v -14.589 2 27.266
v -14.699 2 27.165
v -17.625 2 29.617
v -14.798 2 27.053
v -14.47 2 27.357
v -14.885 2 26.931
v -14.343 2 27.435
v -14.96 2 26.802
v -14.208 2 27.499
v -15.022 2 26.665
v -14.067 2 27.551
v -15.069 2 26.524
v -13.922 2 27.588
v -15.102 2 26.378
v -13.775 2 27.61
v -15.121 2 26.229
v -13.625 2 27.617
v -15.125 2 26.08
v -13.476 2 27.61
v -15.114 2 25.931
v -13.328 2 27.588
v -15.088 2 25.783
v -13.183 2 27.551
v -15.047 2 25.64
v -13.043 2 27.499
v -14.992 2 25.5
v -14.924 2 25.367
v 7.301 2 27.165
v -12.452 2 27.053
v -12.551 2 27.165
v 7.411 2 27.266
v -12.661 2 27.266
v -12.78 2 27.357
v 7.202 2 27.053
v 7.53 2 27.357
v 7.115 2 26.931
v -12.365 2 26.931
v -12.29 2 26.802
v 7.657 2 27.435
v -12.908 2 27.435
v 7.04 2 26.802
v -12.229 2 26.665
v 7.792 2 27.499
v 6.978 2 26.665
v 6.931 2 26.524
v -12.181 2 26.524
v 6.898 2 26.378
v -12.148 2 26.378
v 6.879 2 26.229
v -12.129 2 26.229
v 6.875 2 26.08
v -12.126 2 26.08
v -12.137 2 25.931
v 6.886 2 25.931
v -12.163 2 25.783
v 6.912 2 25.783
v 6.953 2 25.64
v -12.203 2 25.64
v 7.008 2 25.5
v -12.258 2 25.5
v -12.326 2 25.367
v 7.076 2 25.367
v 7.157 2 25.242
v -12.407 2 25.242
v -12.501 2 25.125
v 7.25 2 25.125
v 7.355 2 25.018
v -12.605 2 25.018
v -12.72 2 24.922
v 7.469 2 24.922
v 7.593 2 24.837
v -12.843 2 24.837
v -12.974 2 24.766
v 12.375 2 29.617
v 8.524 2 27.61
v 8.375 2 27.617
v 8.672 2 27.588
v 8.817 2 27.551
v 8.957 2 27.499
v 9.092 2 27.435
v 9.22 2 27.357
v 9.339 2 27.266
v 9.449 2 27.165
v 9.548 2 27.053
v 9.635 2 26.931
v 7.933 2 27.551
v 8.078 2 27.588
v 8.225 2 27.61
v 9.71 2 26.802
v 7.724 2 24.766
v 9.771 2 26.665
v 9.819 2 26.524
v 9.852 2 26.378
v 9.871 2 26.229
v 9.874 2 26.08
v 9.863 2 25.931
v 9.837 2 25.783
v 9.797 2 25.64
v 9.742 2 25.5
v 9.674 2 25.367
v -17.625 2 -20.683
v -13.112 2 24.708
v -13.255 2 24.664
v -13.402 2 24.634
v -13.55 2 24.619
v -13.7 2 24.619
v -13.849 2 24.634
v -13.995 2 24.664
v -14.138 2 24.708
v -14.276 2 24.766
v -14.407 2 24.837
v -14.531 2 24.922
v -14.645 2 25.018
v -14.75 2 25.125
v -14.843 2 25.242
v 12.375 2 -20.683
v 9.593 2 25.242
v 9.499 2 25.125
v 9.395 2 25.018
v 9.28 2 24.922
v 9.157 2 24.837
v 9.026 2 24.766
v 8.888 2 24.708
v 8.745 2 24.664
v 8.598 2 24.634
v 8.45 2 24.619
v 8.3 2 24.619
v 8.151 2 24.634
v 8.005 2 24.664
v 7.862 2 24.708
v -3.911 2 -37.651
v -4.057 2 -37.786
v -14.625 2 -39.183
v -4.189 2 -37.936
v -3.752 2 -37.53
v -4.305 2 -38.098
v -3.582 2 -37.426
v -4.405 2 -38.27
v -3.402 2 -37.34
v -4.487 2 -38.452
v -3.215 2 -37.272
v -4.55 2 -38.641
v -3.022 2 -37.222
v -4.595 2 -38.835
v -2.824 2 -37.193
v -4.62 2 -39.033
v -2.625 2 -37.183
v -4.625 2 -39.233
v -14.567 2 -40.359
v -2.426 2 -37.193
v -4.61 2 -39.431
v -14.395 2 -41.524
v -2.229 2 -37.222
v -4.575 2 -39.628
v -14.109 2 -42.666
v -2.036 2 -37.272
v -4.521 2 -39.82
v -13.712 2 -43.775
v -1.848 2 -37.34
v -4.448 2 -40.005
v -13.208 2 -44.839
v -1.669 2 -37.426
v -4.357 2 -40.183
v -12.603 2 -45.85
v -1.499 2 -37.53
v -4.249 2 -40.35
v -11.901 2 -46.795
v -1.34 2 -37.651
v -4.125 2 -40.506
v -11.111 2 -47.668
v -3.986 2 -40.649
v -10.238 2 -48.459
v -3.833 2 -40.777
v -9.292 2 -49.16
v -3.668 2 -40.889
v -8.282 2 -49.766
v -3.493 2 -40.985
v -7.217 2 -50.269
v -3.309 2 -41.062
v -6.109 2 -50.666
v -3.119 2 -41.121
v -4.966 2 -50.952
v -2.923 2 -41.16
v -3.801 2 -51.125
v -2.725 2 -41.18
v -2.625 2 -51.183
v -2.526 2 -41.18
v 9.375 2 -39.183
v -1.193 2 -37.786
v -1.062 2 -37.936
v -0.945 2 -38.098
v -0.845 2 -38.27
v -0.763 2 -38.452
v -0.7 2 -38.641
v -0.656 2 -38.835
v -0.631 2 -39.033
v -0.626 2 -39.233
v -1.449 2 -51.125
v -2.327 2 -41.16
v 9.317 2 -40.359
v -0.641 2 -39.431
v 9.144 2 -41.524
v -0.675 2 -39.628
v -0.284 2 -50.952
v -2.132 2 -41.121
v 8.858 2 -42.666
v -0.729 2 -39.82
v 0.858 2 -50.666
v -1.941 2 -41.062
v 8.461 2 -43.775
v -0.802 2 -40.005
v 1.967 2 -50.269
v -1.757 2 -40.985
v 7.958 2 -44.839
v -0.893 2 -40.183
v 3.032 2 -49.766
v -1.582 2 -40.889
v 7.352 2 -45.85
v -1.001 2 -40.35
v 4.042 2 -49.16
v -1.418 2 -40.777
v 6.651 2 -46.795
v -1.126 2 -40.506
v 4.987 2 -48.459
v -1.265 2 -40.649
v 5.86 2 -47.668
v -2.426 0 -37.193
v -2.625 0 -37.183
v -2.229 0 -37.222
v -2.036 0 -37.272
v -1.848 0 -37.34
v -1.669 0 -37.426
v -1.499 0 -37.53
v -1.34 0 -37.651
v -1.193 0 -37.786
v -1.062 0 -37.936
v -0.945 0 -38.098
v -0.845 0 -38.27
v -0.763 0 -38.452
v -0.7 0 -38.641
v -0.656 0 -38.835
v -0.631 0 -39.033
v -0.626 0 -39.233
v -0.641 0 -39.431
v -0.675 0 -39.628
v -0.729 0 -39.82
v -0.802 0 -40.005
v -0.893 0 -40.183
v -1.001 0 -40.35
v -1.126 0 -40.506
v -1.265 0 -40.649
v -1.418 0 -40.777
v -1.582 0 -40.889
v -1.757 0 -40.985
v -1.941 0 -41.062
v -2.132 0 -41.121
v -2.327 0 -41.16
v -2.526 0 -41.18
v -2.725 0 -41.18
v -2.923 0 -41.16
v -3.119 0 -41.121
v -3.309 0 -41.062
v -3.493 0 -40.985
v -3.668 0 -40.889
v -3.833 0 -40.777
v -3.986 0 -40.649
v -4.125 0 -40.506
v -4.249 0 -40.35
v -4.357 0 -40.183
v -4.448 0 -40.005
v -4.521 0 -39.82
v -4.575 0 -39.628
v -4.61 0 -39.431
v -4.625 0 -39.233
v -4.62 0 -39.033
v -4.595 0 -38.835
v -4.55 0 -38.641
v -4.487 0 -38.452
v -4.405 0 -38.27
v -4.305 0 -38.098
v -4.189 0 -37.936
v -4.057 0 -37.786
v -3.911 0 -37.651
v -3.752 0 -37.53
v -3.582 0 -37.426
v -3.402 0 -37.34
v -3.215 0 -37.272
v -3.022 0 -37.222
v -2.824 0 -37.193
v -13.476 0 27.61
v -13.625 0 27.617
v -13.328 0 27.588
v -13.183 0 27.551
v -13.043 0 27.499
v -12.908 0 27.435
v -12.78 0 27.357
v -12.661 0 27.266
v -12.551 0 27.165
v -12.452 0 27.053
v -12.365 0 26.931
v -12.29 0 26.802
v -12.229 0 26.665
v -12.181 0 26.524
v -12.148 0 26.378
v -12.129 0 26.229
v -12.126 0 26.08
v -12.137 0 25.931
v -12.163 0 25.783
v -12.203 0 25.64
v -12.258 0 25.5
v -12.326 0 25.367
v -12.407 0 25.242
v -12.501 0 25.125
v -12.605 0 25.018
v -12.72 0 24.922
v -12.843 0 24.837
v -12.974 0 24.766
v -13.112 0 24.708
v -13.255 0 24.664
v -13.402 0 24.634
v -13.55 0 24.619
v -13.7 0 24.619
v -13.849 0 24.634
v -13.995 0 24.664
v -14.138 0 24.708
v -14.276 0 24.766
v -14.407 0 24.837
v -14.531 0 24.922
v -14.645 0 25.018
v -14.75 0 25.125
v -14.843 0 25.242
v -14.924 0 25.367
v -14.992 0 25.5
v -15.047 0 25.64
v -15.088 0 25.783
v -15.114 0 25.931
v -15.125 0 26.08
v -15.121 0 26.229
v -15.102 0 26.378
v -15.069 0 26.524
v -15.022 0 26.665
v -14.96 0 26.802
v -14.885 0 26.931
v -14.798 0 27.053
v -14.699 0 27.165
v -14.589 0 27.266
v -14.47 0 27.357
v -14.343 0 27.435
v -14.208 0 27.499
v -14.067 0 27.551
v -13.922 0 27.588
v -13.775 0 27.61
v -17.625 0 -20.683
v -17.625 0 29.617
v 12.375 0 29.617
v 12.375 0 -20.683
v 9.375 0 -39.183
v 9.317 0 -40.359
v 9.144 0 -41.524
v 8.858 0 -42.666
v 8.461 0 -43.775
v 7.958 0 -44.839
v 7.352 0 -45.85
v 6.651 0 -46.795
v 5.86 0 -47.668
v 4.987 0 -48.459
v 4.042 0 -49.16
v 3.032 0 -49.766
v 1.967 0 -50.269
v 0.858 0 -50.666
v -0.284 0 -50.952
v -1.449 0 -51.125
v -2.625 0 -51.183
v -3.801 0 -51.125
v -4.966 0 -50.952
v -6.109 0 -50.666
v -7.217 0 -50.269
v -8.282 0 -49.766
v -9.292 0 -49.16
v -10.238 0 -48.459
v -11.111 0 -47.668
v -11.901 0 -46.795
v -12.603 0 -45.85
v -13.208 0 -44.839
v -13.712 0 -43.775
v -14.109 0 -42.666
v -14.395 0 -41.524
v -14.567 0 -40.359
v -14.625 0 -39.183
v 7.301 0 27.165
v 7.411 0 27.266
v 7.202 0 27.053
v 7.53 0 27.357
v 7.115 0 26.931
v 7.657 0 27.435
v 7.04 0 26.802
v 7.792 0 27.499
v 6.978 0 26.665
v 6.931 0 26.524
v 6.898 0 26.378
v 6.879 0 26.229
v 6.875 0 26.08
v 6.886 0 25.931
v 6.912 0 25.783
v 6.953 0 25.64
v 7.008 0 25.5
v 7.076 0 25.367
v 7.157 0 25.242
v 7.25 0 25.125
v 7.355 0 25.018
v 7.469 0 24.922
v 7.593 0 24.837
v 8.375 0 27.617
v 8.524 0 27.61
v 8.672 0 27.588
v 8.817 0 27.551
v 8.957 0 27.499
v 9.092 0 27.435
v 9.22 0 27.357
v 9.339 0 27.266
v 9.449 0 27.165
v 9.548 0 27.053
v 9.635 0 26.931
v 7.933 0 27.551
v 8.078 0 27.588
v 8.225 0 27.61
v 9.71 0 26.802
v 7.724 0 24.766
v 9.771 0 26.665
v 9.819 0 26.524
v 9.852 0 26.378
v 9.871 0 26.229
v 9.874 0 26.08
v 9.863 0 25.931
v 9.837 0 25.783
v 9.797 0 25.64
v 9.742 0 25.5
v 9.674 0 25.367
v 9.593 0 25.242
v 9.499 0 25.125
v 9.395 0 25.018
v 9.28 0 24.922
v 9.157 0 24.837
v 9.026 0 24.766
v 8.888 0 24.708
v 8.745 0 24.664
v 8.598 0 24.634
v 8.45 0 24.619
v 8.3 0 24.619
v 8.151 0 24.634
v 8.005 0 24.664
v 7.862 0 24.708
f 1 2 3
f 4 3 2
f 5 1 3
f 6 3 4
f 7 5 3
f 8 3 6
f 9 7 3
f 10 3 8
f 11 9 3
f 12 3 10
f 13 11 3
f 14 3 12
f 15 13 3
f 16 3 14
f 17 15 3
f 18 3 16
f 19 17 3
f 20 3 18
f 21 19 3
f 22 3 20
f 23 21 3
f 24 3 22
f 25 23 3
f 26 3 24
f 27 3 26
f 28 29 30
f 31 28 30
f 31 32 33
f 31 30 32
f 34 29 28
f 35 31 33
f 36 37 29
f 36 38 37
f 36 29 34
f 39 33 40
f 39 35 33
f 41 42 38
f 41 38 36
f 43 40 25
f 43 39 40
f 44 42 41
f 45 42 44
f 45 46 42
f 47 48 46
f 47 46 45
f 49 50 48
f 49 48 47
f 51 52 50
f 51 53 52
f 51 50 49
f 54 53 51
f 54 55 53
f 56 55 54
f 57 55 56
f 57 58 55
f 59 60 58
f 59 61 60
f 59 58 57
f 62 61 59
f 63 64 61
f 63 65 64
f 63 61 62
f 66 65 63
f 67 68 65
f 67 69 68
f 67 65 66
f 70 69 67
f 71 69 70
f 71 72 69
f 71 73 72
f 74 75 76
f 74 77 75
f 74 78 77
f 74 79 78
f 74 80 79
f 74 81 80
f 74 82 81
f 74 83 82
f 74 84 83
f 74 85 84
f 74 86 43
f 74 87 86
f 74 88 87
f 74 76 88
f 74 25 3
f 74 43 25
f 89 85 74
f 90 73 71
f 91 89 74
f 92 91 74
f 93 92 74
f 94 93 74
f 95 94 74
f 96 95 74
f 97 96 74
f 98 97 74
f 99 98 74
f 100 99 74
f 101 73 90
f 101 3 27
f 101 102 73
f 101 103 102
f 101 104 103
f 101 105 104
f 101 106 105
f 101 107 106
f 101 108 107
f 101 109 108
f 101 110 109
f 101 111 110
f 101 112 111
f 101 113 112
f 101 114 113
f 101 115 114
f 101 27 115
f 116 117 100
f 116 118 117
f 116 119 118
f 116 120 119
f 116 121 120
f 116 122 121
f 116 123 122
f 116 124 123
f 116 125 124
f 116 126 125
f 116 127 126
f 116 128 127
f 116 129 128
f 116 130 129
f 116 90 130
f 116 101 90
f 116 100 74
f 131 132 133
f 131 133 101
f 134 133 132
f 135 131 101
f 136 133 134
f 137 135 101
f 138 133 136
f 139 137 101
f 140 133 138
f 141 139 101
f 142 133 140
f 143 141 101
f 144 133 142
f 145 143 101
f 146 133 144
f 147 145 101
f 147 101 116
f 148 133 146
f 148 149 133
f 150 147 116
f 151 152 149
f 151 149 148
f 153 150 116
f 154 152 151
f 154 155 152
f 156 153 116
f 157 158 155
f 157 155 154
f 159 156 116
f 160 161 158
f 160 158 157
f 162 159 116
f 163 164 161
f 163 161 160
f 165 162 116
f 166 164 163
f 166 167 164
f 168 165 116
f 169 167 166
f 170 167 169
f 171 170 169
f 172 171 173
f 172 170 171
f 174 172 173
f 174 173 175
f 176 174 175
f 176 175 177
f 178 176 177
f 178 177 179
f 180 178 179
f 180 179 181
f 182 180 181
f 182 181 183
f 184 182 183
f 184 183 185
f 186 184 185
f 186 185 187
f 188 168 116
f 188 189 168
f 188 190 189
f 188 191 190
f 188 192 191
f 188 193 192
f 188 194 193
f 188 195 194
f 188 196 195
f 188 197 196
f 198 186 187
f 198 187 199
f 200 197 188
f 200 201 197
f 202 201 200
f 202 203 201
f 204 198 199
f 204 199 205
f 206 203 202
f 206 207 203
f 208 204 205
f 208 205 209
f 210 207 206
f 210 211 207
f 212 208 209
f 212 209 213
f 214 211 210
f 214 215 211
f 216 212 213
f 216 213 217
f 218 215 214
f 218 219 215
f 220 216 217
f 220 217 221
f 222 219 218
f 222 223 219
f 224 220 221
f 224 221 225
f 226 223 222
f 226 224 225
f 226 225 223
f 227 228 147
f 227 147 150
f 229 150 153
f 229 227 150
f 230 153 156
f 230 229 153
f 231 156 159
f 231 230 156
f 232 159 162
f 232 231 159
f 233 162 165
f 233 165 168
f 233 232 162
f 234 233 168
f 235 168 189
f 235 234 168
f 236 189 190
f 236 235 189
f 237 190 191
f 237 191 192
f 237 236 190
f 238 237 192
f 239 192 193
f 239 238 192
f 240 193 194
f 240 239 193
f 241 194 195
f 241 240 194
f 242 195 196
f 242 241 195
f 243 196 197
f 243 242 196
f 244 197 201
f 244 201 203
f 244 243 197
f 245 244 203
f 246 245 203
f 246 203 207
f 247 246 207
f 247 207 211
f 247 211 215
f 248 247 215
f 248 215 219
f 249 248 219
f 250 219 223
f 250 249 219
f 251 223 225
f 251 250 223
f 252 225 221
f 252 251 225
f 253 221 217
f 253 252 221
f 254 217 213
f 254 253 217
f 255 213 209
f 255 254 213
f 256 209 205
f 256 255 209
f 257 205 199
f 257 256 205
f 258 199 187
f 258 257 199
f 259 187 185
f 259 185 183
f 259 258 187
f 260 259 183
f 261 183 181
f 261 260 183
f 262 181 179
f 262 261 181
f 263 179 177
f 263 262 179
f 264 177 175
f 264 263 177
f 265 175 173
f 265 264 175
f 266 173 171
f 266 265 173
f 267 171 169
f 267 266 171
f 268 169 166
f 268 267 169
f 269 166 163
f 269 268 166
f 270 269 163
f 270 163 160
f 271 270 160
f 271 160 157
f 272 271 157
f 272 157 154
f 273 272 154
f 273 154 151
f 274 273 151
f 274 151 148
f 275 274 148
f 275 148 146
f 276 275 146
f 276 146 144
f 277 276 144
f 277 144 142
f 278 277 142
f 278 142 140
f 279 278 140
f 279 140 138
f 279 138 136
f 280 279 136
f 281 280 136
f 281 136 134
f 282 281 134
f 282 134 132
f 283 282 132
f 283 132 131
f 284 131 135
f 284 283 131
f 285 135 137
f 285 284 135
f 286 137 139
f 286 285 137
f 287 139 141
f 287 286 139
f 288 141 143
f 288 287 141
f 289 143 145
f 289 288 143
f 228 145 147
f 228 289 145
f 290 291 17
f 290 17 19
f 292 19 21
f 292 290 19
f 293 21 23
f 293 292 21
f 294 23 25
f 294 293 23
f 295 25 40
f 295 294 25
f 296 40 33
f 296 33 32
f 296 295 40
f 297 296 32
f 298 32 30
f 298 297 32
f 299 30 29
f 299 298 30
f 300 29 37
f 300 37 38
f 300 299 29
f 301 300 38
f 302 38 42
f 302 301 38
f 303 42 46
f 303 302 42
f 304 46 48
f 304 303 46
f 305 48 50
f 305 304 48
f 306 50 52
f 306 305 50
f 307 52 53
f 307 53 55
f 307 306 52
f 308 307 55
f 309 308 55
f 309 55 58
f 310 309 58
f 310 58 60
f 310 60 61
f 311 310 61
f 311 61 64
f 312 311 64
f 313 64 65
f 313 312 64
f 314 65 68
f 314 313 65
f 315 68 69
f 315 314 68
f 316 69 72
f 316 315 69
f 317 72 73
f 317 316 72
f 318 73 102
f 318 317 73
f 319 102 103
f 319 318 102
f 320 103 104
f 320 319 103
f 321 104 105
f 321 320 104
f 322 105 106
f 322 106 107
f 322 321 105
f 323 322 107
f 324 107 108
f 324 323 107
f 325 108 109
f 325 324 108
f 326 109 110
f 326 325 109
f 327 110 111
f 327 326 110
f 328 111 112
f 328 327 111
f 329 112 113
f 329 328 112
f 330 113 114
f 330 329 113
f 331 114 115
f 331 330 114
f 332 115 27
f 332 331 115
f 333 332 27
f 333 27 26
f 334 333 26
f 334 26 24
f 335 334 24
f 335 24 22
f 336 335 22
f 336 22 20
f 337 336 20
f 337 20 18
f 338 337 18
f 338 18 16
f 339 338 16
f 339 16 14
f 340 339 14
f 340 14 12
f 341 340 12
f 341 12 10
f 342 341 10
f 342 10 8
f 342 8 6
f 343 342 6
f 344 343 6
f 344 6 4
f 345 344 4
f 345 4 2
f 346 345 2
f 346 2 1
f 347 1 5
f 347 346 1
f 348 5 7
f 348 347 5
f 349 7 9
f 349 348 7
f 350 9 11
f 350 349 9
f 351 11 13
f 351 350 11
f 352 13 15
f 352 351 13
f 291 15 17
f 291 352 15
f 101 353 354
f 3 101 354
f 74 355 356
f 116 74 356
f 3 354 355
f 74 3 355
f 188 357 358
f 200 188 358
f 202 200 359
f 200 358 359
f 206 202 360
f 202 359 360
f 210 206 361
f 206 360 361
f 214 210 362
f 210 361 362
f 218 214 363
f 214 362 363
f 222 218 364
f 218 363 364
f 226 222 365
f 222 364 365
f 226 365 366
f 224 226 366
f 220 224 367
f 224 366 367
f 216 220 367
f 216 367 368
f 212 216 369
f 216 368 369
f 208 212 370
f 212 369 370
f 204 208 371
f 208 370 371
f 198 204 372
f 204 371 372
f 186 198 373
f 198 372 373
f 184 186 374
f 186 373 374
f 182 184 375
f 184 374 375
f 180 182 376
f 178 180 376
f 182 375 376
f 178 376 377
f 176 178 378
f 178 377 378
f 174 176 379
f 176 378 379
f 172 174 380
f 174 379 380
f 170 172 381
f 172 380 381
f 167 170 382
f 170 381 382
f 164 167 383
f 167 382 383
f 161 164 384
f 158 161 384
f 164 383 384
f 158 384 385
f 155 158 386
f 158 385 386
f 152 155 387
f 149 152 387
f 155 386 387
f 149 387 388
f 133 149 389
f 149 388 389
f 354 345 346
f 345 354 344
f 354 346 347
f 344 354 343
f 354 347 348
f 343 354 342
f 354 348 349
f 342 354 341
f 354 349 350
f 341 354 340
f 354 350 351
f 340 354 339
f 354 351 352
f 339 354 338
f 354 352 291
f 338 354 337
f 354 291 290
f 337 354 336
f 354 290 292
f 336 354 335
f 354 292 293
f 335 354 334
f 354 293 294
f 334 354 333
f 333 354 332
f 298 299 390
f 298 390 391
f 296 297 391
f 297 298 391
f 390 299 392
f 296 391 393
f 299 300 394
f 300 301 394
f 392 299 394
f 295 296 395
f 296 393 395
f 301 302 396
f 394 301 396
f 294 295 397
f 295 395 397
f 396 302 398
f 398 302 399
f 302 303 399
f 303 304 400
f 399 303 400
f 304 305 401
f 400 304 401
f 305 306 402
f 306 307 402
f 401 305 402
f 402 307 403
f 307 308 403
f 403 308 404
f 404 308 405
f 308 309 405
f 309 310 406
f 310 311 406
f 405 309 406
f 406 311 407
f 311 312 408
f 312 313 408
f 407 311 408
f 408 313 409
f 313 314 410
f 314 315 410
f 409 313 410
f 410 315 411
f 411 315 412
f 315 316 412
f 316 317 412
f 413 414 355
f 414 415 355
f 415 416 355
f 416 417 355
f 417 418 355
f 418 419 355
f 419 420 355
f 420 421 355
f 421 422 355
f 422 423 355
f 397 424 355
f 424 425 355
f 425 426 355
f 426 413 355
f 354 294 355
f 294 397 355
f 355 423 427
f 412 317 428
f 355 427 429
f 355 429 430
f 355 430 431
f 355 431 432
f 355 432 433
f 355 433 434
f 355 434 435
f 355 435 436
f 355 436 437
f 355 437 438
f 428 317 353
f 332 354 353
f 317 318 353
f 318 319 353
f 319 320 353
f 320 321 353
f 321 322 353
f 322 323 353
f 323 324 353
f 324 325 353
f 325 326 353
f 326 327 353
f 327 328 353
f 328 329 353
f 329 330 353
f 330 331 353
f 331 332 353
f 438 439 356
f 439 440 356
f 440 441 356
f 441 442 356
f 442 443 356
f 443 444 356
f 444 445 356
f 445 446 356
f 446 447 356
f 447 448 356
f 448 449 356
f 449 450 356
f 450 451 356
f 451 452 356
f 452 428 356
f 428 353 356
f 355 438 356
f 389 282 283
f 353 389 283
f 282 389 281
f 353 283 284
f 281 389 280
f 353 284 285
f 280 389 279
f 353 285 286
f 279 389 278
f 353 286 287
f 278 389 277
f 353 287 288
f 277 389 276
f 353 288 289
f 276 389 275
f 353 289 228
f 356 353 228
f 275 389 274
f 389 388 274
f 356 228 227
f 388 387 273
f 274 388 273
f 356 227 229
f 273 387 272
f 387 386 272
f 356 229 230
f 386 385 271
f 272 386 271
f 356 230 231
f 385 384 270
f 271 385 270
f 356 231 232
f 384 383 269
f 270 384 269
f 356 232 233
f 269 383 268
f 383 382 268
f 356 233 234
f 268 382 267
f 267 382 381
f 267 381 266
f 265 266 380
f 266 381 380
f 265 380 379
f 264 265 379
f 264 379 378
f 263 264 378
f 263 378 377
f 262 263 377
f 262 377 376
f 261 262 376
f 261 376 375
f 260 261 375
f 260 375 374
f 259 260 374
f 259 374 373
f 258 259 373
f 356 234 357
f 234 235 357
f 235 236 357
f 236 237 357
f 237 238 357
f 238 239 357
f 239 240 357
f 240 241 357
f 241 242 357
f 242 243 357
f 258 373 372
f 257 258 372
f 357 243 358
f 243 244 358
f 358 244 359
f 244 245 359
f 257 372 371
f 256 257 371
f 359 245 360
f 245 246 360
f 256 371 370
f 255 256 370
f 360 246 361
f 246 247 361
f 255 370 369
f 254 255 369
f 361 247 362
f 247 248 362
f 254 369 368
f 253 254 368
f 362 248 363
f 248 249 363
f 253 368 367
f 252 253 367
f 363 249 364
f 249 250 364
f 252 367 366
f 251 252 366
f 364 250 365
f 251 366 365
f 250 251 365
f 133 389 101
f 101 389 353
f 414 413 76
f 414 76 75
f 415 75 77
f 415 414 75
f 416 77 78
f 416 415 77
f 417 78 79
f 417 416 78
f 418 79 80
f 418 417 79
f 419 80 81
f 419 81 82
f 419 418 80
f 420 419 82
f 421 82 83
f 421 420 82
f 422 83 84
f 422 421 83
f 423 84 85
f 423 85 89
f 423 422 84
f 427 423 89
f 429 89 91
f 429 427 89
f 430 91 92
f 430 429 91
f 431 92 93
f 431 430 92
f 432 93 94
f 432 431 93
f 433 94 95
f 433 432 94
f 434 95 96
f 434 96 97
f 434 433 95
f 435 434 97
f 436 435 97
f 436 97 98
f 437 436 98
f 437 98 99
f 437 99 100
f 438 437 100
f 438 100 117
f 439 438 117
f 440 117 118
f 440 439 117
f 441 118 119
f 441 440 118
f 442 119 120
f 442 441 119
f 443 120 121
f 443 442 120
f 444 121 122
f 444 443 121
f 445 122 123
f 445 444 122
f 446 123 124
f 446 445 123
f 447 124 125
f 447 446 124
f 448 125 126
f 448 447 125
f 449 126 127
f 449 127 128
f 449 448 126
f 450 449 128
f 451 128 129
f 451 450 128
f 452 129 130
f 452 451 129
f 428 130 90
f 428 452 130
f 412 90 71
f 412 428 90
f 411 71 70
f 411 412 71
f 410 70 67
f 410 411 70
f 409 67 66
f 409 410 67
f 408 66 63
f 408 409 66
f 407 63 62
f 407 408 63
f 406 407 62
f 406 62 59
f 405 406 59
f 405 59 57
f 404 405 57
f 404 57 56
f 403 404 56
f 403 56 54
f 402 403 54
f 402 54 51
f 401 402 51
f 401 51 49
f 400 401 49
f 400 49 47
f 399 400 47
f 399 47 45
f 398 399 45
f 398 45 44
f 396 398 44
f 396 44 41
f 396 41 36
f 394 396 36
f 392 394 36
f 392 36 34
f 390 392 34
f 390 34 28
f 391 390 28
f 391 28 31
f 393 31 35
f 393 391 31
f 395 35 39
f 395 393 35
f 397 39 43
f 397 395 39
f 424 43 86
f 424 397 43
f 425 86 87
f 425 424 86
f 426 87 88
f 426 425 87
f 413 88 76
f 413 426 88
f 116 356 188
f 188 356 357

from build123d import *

# Parameters (mm, degrees)
SKETCH_1_R      = 1.5
SKETCH_1_R_2    = 2
EXTRUDE_1_DEPTH = 2


with BuildPart() as part:
    # Эскиз1 → Бобышка-Вытянуть1 (new body)
    with BuildSketch(Plane(origin=(0, 0, 0), x_dir=(1, 0, 0), z_dir=(0, 1, 0))):
        with BuildLine():
            Line((12.374772085, -29.617278809), (12.374772085, 20.682721191))
            Line((12.374772085, 20.682721191), (9.374772085, 39.182721191))
            ThreePointArc((9.374772085, 39.182721191), (-2.625227915, 51.182721191), (-14.625227915, 39.182721191))
            Line((-14.625227915, 39.182721191), (-17.625227915, 20.682721191))
            Line((-17.625227915, 20.682721191), (-17.625227915, -29.617278809))
            Line((-17.625227915, -29.617278809), (-10.625227915, -29.617278809))
            Line((-10.625227915, -29.617278809), (5.374772085, -29.617278809))
            Line((5.374772085, -29.617278809), (12.374772085, -29.617278809))
        make_face()
        with Locations(Location((-13.625227915, -26.117278809, 0), (0, 0, 270))):
            Circle(SKETCH_1_R, mode=Mode.SUBTRACT)
        with Locations(Location((8.374772085, -26.117278809, 0), (0, 0, 270))):
            Circle(SKETCH_1_R, mode=Mode.SUBTRACT)
        with Locations(Location((-2.625227915, 39.182721191, 0), (0, 0, 270))):
            Circle(SKETCH_1_R_2, mode=Mode.SUBTRACT)
    extrude(amount=EXTRUDE_1_DEPTH)


solid = part.part
